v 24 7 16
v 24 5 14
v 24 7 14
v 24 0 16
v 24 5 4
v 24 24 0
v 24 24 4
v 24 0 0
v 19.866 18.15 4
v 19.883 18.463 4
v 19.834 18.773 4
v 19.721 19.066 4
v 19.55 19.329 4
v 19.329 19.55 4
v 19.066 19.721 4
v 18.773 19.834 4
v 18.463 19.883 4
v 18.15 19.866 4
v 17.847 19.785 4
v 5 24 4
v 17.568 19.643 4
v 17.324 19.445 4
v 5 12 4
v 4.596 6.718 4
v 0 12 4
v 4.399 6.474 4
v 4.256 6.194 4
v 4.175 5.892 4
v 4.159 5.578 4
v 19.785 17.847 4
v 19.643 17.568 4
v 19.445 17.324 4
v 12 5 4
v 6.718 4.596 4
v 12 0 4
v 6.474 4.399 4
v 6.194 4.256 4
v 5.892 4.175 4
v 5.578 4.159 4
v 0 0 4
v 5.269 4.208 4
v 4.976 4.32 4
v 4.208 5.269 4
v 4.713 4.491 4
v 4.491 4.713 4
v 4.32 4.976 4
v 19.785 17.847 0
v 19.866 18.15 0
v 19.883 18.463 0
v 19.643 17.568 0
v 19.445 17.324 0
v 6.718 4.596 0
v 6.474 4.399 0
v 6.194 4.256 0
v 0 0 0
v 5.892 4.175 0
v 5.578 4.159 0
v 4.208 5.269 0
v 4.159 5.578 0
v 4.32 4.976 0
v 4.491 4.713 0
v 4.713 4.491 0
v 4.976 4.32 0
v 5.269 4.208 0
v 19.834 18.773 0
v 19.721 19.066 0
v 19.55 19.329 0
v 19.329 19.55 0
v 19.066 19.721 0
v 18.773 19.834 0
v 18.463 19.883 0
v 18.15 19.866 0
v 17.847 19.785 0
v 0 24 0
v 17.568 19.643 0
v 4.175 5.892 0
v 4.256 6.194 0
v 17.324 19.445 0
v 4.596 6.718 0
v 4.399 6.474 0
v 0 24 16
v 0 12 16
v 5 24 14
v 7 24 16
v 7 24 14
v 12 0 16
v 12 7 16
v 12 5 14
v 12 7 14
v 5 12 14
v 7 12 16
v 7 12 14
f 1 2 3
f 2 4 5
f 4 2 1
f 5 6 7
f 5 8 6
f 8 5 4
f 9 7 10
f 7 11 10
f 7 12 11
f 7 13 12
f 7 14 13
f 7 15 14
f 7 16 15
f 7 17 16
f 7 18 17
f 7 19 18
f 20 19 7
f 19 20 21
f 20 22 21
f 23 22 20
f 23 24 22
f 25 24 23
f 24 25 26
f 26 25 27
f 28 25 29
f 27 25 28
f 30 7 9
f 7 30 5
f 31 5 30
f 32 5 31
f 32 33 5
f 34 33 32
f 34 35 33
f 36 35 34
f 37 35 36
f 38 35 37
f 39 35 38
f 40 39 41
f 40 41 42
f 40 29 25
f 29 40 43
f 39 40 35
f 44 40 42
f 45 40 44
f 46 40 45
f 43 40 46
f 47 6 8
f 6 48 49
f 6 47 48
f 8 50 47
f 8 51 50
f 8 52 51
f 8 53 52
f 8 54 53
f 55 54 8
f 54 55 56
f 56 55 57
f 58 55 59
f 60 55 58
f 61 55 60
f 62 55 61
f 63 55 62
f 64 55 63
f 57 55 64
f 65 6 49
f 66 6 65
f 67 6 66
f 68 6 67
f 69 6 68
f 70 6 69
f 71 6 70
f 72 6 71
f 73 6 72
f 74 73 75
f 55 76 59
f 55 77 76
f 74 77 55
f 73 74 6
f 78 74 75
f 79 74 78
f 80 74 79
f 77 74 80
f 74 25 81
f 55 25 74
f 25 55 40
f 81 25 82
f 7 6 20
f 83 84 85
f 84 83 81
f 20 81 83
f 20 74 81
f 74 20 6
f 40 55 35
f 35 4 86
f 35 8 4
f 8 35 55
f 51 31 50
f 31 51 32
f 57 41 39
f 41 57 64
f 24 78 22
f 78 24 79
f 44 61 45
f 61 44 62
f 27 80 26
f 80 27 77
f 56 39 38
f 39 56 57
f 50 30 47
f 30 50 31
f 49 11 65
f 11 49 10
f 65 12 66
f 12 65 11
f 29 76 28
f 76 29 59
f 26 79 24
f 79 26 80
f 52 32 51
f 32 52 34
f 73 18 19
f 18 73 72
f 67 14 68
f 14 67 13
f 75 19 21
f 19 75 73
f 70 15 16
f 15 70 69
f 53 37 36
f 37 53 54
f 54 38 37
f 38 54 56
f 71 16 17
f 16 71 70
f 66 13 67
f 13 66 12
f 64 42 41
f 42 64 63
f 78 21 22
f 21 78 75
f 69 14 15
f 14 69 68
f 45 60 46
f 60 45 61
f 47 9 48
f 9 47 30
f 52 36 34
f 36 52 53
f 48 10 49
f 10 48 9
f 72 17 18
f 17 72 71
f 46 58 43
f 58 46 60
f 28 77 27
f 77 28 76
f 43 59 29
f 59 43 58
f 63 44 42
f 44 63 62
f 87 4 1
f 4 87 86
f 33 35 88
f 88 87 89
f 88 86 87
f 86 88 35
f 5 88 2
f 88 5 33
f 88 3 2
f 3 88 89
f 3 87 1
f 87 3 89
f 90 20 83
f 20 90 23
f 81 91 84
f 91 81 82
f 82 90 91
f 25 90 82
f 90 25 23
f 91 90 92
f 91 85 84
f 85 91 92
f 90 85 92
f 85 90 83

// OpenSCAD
// openscad model by markwal
// modeled on thing:613685 by jherridge
// dimensions in mm

// Do you want tabs to hold the glass or a full corner?
full_corner=0;  // [0:tabs,1:full corner]

// (mm) a thicker base requires a longer screw
base_thickness=4;

// (mm) thickness of your build platform before the glass is added (both the heater and the aluminum)
heated_bed_thickness=10;

// (mm) thickness of the glass plate rounded down
glass_thickness=2;

// (mm) width of the bolt slot
bolt_diameter=3;

// overhang is the space on each side where the aluminum plate
// is bigger than the glass plate.  Round up because that 
// will just leave some air between the edge of the plate 
// and the clip.  Rounding down will leave play for the glass.

// (mm) the overhang pushes on the glass to hold it in place, the smaller the glass (in x and y) the more overhang you need
overhang=2;

union() {

difference() {
	// base
	cube([24,24,base_thickness]);

	// slot
	rotate([0,0,-45]) 
	translate([0,8,0]) hull() {
		translate([0,18,0])
			cylinder(h=base_thickness,d=bolt_diameter, $fn=30);
		cylinder(h=base_thickness,d=bolt_diameter,$fn=30);
	}
}

// we make the towers completely overlap the base and
// the overhang in order to avoid problems generating
// the mesh when rounding may have the faces not overlap
translate([12*(1-full_corner),0,0])
	cube([12*(1+full_corner),5,base_thickness+heated_bed_thickness+glass_thickness]);
translate([12*(1-full_corner),0,base_thickness+heated_bed_thickness])
	cube([12*(1+full_corner),5+overhang,glass_thickness]);

translate([0,12*(1-full_corner),0])
	cube([5,12*(1+full_corner),base_thickness+heated_bed_thickness+glass_thickness]);
translate([0,12*(1-full_corner),base_thickness+heated_bed_thickness])
	cube([5+overhang,12*(1+full_corner),glass_thickness]);
}
